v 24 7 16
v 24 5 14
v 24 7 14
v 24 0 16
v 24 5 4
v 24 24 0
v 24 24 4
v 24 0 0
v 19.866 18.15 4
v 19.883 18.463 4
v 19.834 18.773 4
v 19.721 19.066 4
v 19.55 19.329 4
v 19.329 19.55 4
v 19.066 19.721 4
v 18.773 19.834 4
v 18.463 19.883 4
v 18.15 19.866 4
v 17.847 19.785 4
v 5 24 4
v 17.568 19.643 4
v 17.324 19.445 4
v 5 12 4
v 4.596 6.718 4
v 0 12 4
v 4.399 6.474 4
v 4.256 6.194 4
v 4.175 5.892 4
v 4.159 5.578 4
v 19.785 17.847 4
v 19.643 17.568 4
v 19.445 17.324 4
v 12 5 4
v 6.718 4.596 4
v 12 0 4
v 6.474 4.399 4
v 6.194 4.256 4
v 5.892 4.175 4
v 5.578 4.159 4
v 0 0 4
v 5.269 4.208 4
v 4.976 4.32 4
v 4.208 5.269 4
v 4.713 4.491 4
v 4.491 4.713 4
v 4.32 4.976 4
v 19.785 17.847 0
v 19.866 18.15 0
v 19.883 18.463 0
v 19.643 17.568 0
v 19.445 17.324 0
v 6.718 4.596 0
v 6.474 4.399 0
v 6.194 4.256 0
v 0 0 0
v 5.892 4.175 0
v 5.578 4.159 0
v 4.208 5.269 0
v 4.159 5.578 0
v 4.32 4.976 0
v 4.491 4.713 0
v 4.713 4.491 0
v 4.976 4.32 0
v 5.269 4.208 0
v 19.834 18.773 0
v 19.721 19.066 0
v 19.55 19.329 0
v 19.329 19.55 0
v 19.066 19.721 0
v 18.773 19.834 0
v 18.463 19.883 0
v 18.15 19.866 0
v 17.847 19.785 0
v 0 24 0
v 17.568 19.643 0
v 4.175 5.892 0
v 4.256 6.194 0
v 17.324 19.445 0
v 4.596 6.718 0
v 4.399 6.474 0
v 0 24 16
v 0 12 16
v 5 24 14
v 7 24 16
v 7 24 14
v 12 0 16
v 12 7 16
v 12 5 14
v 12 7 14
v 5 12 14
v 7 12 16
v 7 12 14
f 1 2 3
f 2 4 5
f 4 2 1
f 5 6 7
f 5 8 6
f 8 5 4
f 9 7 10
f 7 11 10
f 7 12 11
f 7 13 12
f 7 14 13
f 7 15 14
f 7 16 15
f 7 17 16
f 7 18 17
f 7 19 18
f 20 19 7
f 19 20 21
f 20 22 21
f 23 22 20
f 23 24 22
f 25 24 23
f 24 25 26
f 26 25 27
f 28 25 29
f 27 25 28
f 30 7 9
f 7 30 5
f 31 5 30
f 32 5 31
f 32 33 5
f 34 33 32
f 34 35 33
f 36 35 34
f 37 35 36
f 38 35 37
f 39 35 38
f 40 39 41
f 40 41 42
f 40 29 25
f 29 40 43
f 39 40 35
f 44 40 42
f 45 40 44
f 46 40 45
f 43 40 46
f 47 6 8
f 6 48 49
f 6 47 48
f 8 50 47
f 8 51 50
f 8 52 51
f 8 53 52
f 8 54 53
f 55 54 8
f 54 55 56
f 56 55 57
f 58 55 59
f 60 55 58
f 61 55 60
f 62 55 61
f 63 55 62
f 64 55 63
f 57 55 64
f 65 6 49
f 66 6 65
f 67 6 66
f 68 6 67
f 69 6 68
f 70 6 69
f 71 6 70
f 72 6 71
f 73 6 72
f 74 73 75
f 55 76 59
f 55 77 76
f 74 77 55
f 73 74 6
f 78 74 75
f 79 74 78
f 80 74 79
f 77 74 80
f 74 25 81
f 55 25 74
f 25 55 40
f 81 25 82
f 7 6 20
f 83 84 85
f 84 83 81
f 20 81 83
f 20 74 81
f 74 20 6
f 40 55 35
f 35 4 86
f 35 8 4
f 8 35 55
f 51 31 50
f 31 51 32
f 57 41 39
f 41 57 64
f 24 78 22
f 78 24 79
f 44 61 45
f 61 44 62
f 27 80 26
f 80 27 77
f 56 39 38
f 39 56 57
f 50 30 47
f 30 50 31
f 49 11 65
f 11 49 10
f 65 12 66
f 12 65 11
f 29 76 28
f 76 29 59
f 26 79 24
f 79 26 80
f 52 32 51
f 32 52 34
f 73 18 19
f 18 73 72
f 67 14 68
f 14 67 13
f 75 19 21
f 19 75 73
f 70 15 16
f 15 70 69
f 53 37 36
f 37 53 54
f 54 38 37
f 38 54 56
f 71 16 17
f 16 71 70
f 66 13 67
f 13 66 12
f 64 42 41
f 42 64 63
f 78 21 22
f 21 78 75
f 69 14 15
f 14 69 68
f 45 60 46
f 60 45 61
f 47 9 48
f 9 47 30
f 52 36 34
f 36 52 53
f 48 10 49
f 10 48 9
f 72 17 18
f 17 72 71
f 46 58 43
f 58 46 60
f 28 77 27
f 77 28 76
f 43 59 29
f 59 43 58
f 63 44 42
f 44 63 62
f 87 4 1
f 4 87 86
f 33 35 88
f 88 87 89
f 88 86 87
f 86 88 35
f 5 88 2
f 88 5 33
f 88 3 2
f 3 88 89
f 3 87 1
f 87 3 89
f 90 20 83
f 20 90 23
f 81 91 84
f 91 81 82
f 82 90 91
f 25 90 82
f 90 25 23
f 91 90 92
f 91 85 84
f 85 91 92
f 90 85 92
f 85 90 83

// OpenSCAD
// openscad model by markwal
// modeled on thing:613685 by jherridge
// dimensions in mm

// Do you want tabs to hold the glass or a full corner?
full_corner=0;  // [0:tabs,1:full corner]

// (mm) a thicker base requires a longer screw
base_thickness=4;

// (mm) thickness of your build platform before the glass is added (both the heater and the aluminum)
heated_bed_thickness=10;

// (mm) thickness of the glass plate rounded down
glass_thickness=2;

// (mm) width of the bolt slot
bolt_diameter=3;

// overhang is the space on each side where the aluminum plate
// is bigger than the glass plate.  Round up because that 
// will just leave some air between the edge of the plate 
// and the clip.  Rounding down will leave play for the glass.

// (mm) the overhang pushes on the glass to hold it in place, the smaller the glass (in x and y) the more overhang you need
overhang=2;

union() {

difference() {
	// base
	cube([24,24,base_thickness]);

	// slot
	rotate([0,0,-45]) 
	translate([0,8,0]) hull() {
		translate([0,18,0])
			cylinder(h=base_thickness,d=bolt_diameter, $fn=30);
		cylinder(h=base_thickness,d=bolt_diameter,$fn=30);
	}
}

// we make the towers completely overlap the base and
// the overhang in order to avoid problems generating
// the mesh when rounding may have the faces not overlap
translate([12*(1-full_corner),0,0])
	cube([12*(1+full_corner),5,base_thickness+heated_bed_thickness+glass_thickness]);
translate([12*(1-full_corner),0,base_thickness+heated_bed_thickness])
	cube([12*(1+full_corner),5+overhang,glass_thickness]);

translate([0,12*(1-full_corner),0])
	cube([5,12*(1+full_corner),base_thickness+heated_bed_thickness+glass_thickness]);
translate([0,12*(1-full_corner),base_thickness+heated_bed_thickness])
	cube([5+overhang,12*(1+full_corner),glass_thickness]);
}
